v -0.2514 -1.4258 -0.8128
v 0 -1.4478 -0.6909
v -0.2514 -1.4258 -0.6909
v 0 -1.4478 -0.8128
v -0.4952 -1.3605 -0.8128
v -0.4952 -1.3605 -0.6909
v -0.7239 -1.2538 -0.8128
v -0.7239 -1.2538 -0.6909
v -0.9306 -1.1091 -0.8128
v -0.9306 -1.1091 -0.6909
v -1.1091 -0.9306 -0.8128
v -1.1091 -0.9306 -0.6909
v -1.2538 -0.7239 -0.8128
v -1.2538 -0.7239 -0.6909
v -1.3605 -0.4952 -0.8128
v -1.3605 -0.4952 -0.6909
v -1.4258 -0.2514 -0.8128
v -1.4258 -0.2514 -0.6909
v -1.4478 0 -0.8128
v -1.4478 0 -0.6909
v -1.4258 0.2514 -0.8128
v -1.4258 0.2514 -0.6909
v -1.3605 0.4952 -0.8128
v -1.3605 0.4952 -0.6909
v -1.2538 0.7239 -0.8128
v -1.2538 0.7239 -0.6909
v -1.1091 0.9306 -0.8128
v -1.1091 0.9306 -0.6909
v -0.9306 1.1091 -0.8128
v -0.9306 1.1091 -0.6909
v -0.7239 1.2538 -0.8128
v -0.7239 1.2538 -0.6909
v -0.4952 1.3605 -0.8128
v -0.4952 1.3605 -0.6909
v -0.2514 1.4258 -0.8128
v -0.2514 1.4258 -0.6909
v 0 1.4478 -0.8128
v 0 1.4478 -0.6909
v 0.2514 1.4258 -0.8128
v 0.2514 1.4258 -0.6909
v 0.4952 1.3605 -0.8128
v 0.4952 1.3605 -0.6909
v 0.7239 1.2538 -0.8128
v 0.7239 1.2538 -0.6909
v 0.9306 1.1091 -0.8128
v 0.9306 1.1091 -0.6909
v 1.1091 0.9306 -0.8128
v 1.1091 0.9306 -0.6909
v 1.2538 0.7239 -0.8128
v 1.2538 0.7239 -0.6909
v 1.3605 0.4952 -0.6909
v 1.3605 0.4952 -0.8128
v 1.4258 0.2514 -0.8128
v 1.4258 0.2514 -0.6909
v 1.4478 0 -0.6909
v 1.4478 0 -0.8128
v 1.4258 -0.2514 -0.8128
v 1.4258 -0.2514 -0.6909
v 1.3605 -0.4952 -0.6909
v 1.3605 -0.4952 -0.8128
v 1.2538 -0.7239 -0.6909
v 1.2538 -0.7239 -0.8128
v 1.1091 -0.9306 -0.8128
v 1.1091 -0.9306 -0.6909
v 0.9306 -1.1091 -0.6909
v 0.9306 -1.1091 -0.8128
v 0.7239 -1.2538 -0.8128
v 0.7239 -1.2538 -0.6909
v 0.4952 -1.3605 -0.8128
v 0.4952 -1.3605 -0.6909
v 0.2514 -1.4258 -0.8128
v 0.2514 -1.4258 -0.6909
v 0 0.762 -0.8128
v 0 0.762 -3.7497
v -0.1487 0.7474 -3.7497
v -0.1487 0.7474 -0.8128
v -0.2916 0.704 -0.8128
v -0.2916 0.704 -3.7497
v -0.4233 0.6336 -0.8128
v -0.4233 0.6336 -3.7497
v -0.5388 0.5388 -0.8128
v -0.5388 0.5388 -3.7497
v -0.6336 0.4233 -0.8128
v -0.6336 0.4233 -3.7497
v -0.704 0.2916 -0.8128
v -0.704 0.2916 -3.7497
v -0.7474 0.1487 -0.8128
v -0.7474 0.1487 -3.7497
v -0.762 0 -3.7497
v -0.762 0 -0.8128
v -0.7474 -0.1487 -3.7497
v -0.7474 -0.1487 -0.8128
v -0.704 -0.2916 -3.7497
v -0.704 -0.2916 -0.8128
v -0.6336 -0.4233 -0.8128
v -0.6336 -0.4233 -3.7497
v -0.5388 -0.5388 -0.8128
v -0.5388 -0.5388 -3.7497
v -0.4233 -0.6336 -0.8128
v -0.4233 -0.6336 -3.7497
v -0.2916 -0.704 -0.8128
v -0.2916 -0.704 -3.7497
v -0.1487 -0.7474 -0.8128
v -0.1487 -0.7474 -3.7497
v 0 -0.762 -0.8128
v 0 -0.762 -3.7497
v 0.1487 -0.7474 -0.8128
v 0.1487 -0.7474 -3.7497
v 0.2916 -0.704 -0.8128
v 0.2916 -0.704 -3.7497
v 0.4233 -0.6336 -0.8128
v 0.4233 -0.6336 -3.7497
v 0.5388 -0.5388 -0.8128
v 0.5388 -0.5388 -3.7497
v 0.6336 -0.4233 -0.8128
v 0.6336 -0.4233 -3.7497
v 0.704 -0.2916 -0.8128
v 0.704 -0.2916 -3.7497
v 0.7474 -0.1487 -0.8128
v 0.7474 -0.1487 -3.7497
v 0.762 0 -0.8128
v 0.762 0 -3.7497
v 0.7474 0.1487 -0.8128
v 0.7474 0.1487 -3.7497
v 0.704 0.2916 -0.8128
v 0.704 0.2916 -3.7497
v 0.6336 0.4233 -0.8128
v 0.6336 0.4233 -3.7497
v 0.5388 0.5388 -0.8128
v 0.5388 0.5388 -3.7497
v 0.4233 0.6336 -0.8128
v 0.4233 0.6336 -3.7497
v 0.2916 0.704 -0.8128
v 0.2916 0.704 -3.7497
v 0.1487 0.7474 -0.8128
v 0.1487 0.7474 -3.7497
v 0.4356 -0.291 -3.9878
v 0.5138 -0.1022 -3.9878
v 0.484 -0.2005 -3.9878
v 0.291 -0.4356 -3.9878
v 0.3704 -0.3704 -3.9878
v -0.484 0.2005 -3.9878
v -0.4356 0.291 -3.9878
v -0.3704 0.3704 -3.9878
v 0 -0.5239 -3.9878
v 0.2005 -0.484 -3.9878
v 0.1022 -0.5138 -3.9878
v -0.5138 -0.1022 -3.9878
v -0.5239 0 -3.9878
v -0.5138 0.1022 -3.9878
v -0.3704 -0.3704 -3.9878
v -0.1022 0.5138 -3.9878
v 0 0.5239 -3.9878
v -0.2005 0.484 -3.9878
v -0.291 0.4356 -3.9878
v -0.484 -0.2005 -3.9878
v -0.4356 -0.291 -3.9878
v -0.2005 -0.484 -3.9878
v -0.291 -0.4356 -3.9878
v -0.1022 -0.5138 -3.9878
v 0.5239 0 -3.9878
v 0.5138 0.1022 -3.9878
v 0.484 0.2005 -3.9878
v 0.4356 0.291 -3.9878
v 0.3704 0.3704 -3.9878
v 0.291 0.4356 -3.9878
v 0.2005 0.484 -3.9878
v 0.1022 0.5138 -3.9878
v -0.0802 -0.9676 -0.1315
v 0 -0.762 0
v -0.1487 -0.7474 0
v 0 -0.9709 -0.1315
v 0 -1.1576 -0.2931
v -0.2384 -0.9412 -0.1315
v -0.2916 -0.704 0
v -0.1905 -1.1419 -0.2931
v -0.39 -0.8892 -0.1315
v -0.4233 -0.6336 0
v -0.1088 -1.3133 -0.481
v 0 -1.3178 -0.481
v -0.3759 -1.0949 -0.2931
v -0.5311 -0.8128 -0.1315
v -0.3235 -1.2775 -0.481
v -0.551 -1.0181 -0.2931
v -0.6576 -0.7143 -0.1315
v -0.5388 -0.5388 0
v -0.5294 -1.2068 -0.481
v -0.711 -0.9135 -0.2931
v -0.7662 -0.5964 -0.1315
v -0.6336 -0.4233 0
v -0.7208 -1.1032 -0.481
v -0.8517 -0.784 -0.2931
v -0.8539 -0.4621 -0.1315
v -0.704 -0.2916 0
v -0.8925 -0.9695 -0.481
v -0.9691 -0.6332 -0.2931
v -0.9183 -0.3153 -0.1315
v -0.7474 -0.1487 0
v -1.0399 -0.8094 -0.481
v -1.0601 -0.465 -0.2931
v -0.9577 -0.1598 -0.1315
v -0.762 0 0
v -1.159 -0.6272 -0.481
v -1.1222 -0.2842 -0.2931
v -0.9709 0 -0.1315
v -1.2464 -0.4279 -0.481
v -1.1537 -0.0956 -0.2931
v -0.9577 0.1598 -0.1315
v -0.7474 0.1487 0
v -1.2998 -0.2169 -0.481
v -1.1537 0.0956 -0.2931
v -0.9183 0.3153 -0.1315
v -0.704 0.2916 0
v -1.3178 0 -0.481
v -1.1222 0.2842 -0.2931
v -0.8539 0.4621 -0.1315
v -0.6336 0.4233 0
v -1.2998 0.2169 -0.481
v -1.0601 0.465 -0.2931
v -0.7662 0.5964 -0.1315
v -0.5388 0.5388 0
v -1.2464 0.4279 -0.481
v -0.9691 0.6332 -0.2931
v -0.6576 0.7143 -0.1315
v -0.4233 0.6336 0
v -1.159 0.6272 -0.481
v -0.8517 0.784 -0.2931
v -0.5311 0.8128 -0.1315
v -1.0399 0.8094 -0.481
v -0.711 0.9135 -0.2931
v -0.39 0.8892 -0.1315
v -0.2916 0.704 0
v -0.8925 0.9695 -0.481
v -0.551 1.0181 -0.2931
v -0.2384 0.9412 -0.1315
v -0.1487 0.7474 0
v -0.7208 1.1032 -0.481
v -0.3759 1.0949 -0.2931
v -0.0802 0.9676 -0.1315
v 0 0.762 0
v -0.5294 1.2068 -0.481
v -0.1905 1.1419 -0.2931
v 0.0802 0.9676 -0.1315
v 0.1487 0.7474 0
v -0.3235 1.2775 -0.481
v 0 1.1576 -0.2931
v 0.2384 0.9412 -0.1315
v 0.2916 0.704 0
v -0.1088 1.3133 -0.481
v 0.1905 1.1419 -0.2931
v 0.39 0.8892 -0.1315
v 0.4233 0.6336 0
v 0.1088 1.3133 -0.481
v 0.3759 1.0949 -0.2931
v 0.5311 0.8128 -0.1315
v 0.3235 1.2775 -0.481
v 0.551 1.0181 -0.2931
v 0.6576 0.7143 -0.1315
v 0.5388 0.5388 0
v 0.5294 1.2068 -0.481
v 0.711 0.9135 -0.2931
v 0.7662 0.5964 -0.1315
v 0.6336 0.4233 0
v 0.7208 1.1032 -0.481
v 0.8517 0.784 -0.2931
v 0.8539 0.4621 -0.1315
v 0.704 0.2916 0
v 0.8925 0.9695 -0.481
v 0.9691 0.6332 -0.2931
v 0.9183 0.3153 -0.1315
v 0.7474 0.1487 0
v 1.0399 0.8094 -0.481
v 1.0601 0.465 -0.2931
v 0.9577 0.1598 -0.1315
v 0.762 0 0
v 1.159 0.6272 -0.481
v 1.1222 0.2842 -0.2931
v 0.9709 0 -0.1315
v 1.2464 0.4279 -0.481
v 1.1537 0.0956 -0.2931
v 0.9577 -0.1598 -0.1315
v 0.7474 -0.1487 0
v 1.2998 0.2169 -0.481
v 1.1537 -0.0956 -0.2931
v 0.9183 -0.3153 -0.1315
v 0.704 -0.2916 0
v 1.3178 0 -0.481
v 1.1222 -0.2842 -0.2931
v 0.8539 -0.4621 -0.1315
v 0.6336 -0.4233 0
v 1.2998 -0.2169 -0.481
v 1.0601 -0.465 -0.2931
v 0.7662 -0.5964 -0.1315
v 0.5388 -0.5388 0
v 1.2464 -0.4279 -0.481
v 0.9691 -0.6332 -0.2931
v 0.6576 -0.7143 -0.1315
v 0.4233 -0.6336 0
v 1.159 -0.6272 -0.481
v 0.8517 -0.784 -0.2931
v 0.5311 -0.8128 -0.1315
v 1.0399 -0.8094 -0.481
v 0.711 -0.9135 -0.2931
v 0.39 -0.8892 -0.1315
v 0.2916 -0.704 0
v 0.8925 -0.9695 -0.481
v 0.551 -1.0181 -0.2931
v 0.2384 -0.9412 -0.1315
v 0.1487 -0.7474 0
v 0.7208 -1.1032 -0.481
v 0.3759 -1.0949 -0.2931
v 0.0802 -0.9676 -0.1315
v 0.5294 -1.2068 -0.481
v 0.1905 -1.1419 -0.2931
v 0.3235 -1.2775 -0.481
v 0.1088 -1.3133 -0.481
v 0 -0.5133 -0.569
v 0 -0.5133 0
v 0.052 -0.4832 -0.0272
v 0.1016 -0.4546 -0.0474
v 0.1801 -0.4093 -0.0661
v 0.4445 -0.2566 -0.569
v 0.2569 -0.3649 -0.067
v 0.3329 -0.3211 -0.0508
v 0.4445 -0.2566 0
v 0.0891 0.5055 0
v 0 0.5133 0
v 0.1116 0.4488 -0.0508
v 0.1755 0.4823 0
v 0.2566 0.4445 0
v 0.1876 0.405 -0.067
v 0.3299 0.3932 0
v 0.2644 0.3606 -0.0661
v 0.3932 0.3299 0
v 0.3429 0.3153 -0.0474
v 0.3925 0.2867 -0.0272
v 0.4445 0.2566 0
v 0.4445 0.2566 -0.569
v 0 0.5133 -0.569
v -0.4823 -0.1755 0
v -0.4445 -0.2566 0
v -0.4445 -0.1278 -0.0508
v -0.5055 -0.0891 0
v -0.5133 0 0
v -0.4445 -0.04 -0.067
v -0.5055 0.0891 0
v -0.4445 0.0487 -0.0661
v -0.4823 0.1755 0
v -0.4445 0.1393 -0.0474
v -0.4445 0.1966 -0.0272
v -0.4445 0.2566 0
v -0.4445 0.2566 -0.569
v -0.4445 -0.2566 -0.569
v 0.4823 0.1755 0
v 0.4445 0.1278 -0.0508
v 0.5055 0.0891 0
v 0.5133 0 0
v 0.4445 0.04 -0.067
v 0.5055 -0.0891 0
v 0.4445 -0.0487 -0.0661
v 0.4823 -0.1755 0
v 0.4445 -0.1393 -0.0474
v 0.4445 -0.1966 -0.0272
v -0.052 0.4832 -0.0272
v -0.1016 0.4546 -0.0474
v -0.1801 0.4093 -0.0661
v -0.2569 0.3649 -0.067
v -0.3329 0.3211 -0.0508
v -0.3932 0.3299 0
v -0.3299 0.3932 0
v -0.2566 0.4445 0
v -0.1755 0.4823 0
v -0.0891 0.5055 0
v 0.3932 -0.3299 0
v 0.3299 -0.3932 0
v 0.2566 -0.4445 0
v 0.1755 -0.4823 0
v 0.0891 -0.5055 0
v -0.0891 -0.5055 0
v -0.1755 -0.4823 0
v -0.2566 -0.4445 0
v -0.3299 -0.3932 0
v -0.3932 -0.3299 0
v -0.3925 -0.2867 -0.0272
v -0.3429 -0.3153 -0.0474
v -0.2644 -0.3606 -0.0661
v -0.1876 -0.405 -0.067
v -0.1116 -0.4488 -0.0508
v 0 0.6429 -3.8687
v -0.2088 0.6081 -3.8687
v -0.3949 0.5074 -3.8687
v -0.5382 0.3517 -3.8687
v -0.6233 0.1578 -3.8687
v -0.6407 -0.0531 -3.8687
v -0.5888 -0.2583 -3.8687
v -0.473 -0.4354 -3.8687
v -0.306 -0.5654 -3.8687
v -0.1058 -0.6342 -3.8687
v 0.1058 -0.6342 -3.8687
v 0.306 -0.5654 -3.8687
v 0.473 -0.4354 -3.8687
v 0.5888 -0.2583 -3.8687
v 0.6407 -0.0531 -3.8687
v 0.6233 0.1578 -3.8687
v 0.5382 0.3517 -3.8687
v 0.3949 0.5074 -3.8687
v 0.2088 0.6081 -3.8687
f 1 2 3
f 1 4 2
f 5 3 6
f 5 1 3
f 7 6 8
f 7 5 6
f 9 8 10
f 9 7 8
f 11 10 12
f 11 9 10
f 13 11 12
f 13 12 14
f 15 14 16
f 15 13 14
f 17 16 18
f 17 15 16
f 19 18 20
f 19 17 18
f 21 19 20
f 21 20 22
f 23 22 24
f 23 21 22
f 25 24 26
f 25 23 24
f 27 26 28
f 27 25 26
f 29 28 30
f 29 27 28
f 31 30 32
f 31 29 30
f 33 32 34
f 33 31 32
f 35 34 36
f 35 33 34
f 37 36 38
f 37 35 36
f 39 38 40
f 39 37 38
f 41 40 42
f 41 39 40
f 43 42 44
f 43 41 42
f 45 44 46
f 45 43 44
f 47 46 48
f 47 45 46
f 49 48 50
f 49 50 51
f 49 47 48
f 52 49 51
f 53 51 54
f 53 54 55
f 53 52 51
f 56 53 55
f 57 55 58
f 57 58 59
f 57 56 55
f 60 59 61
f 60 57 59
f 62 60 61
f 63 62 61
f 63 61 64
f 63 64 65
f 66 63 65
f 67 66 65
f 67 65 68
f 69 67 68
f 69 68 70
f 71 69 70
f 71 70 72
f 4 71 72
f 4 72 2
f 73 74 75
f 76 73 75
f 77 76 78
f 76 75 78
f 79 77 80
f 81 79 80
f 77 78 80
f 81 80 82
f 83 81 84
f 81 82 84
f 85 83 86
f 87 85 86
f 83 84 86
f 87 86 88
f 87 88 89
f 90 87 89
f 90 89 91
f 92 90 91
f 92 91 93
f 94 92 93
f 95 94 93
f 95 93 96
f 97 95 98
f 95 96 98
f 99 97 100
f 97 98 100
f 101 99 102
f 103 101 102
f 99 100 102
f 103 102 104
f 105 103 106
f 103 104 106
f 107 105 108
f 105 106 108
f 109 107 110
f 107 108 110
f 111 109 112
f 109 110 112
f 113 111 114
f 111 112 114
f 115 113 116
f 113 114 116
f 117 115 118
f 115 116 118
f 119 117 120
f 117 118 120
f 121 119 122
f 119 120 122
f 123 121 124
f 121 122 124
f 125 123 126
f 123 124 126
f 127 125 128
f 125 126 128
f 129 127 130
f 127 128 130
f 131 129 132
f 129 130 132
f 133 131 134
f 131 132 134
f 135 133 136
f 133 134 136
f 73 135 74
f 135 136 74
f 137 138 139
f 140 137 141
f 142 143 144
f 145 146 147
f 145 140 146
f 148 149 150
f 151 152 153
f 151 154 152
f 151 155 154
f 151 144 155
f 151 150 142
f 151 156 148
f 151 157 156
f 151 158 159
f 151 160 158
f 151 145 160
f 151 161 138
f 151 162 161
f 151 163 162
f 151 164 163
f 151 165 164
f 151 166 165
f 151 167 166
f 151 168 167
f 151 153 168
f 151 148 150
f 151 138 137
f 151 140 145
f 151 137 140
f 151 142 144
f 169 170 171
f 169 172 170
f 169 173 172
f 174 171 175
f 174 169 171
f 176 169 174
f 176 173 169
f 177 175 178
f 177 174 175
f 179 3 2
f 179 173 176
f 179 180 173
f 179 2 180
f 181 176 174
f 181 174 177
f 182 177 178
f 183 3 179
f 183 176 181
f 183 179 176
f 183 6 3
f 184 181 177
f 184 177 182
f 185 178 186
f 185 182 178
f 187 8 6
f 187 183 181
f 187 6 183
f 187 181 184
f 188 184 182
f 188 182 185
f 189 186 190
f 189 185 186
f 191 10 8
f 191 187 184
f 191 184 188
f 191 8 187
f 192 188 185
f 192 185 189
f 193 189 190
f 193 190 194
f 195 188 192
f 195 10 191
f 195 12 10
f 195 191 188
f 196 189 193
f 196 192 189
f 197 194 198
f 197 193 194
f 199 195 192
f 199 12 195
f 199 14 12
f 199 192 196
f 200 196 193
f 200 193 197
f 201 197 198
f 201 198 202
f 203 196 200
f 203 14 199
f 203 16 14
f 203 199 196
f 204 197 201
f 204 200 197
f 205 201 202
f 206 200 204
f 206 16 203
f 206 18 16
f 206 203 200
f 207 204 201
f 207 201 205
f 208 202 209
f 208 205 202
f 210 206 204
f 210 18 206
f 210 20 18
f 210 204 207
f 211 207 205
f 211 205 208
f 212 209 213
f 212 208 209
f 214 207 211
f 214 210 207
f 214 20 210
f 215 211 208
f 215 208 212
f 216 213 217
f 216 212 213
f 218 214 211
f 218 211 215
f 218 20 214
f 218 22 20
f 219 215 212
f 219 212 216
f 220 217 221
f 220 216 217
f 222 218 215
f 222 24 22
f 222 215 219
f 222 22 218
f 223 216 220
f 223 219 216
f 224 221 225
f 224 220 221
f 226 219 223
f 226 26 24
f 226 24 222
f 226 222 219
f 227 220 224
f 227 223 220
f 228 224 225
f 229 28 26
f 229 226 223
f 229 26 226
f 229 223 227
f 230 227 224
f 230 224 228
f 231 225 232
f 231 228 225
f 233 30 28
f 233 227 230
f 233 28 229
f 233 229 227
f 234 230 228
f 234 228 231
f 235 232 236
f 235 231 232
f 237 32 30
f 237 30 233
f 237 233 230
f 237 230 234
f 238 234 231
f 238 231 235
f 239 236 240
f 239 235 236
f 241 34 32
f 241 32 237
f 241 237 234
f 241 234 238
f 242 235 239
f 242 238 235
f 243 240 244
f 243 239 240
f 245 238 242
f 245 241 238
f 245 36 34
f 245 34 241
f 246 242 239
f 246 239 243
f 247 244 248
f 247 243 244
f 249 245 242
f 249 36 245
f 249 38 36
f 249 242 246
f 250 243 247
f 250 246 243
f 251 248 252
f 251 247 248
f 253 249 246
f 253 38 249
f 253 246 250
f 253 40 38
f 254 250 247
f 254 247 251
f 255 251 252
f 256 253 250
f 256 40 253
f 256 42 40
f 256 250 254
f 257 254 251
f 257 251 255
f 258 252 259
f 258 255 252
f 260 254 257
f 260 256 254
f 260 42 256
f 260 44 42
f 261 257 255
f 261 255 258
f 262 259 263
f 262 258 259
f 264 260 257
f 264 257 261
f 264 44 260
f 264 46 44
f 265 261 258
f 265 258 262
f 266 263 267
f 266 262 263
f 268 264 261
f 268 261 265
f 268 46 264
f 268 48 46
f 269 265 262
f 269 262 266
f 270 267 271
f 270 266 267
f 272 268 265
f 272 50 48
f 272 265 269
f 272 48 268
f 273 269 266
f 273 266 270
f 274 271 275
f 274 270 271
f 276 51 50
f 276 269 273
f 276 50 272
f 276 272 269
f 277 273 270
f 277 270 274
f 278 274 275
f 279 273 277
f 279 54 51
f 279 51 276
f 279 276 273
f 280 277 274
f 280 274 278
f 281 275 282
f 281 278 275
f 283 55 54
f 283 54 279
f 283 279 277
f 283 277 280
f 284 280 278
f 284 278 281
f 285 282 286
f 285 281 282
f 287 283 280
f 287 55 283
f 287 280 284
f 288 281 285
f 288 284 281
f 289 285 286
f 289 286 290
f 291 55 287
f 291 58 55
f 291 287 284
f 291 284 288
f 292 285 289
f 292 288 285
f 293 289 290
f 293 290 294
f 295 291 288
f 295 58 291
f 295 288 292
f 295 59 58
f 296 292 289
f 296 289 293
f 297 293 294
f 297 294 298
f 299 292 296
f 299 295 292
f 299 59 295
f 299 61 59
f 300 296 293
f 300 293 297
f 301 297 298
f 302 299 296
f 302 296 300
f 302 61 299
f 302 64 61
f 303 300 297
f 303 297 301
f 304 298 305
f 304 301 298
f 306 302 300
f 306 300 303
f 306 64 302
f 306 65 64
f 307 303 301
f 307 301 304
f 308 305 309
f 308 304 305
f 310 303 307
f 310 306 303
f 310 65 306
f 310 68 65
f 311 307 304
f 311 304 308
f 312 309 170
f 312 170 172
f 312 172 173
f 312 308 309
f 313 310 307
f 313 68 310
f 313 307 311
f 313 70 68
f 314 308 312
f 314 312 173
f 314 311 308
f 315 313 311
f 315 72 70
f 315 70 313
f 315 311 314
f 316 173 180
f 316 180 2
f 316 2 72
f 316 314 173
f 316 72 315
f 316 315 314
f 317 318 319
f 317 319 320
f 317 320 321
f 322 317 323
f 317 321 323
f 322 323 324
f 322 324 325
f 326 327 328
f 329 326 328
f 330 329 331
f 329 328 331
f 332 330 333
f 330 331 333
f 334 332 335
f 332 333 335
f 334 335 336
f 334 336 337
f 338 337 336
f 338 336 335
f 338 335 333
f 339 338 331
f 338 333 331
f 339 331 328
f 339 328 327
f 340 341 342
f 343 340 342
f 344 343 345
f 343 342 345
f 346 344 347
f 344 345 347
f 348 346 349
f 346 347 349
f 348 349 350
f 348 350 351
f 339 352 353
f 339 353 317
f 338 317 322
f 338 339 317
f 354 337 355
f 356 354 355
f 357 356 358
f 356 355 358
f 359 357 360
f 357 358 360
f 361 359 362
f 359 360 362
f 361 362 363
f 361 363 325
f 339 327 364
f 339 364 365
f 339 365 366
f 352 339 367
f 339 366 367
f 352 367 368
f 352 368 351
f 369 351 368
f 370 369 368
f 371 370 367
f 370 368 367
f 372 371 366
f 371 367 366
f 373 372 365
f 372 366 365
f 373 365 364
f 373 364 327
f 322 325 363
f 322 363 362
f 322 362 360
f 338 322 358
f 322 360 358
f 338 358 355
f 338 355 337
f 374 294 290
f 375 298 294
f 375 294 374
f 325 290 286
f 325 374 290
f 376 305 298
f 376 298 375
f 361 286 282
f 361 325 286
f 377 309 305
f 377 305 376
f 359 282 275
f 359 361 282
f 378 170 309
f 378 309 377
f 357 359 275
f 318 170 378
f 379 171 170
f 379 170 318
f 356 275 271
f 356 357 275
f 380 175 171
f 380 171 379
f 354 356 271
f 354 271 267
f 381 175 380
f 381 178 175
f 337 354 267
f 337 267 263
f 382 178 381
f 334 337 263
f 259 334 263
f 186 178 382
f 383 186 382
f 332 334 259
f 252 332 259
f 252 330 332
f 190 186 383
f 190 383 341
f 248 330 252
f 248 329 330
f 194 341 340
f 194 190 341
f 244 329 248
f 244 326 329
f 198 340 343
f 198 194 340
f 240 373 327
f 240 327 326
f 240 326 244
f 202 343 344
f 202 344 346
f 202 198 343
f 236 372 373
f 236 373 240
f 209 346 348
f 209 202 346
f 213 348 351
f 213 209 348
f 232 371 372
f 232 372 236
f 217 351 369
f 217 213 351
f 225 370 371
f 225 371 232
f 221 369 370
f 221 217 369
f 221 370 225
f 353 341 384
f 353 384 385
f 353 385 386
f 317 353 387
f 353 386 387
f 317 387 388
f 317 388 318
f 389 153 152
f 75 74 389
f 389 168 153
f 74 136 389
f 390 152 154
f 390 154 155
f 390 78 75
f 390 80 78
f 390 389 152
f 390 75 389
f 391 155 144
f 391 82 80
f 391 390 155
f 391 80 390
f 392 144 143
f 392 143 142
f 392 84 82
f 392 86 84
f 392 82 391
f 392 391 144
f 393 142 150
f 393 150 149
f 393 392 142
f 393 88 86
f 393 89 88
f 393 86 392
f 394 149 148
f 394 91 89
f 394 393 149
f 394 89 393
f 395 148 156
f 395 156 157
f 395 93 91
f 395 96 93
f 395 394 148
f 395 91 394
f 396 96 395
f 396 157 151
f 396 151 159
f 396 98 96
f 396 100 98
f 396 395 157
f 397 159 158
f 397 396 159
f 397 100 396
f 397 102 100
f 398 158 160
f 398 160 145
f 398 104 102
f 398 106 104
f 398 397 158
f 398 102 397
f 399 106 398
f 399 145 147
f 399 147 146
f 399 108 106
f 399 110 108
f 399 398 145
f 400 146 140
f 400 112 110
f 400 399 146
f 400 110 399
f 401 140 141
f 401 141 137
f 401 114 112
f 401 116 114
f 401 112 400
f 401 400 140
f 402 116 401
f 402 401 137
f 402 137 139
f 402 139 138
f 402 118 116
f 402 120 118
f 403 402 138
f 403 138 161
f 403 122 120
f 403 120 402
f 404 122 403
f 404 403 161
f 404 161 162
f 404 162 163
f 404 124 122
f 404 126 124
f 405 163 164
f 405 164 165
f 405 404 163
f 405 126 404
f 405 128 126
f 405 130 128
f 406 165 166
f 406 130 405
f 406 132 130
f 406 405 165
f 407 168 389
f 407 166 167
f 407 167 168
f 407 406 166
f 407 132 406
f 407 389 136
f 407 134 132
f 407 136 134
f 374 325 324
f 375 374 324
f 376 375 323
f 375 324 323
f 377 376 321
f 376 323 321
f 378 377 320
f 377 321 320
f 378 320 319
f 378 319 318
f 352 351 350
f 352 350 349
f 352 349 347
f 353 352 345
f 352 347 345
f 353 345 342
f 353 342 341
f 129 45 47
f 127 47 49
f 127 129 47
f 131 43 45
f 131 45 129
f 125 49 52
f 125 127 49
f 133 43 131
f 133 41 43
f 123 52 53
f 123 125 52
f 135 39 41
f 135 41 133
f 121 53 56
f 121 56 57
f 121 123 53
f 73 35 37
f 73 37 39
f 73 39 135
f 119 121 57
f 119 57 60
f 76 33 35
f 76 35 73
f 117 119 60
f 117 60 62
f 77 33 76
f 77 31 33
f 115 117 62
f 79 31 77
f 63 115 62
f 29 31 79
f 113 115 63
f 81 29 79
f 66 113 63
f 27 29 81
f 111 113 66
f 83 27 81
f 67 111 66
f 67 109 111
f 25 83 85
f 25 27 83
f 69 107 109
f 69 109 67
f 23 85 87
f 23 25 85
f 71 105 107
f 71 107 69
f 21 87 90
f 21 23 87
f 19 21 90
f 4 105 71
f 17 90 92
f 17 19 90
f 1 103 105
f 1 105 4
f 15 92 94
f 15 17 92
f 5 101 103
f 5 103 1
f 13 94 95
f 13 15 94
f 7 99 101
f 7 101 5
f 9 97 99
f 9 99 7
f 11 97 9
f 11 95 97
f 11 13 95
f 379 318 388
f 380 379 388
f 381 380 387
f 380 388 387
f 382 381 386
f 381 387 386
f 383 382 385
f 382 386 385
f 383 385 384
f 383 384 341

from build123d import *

# Parameters (mm, degrees)
SKETCH1_W          = 3.175
SKETCH1_H          = 0.762
CHAMFER1_SIZE      = 0.238125
CUT_EXTRUDE2_DEPTH = 0.56896


with BuildPart() as part:
    # Sketch1 → Revolve1 (revolve)
    with BuildSketch(Plane(origin=(0, 0, 0), x_dir=(0, 0, -1), z_dir=(1, 0, 0))):
        with Locations((2.4003, 0.381)):
            Rectangle(SKETCH1_W, SKETCH1_H)
    revolve(axis=Axis((0, 0, -3.9878), (0, 0, 1)))

    # Chamfer1
    chamfer1_edges = [part.edges().sort_by_distance(p)[0] for p in [
        (0, -0.762, -3.9878),
    ]]
    chamfer(chamfer1_edges, length=CHAMFER1_SIZE)

    # Sketch7 → Revolve2 (revolve)
    with BuildSketch(Plane(origin=(0, 0, 0), x_dir=(0, 0, -1), z_dir=(1, 0, 0))):
        with BuildLine():
            Line((0.69088, 1.4478), (0.8128, 1.4478))
            Line((0.8128, 1.4478), (0.8128, 0))
            Line((0.8128, 0), (0, 0))
            Line((0, 0), (0, 0.762))
            ThreePointArc((0, 0.762), (0.293086751, 1.157641051), (0.69088, 1.4478))
        make_face()
    revolve(axis=Axis((0, 0, 0), (0, 0, -1)))

    # Sketch5 → Cut-Extrude2 (cut)
    with BuildSketch(Plane.XY):
        Polygon((0.4445, -0.256632195), (0.4445, 0.256632195), (0, 0.513264389), (-0.4445, 0.256632195), (-0.4445, -0.256632195), (0, -0.513264389), align=None)
    extrude(amount=-CUT_EXTRUDE2_DEPTH, mode=Mode.SUBTRACT)

    # Cut-Extrude3 cone 1 section (through the dimple's axis) → Cut-Extrude3 (revolve, cut)
    with BuildSketch(Plane(origin=(0, 0, 0), x_dir=(0, -1, 0), z_dir=(1, 0, 0))):
        Polygon((0, 0), (0.513264389, 0), (0, 0.513264389), align=None)
    revolve(axis=Axis((0, 0, 0), (0, 0, -1)), mode=Mode.SUBTRACT)


solid = part.part
